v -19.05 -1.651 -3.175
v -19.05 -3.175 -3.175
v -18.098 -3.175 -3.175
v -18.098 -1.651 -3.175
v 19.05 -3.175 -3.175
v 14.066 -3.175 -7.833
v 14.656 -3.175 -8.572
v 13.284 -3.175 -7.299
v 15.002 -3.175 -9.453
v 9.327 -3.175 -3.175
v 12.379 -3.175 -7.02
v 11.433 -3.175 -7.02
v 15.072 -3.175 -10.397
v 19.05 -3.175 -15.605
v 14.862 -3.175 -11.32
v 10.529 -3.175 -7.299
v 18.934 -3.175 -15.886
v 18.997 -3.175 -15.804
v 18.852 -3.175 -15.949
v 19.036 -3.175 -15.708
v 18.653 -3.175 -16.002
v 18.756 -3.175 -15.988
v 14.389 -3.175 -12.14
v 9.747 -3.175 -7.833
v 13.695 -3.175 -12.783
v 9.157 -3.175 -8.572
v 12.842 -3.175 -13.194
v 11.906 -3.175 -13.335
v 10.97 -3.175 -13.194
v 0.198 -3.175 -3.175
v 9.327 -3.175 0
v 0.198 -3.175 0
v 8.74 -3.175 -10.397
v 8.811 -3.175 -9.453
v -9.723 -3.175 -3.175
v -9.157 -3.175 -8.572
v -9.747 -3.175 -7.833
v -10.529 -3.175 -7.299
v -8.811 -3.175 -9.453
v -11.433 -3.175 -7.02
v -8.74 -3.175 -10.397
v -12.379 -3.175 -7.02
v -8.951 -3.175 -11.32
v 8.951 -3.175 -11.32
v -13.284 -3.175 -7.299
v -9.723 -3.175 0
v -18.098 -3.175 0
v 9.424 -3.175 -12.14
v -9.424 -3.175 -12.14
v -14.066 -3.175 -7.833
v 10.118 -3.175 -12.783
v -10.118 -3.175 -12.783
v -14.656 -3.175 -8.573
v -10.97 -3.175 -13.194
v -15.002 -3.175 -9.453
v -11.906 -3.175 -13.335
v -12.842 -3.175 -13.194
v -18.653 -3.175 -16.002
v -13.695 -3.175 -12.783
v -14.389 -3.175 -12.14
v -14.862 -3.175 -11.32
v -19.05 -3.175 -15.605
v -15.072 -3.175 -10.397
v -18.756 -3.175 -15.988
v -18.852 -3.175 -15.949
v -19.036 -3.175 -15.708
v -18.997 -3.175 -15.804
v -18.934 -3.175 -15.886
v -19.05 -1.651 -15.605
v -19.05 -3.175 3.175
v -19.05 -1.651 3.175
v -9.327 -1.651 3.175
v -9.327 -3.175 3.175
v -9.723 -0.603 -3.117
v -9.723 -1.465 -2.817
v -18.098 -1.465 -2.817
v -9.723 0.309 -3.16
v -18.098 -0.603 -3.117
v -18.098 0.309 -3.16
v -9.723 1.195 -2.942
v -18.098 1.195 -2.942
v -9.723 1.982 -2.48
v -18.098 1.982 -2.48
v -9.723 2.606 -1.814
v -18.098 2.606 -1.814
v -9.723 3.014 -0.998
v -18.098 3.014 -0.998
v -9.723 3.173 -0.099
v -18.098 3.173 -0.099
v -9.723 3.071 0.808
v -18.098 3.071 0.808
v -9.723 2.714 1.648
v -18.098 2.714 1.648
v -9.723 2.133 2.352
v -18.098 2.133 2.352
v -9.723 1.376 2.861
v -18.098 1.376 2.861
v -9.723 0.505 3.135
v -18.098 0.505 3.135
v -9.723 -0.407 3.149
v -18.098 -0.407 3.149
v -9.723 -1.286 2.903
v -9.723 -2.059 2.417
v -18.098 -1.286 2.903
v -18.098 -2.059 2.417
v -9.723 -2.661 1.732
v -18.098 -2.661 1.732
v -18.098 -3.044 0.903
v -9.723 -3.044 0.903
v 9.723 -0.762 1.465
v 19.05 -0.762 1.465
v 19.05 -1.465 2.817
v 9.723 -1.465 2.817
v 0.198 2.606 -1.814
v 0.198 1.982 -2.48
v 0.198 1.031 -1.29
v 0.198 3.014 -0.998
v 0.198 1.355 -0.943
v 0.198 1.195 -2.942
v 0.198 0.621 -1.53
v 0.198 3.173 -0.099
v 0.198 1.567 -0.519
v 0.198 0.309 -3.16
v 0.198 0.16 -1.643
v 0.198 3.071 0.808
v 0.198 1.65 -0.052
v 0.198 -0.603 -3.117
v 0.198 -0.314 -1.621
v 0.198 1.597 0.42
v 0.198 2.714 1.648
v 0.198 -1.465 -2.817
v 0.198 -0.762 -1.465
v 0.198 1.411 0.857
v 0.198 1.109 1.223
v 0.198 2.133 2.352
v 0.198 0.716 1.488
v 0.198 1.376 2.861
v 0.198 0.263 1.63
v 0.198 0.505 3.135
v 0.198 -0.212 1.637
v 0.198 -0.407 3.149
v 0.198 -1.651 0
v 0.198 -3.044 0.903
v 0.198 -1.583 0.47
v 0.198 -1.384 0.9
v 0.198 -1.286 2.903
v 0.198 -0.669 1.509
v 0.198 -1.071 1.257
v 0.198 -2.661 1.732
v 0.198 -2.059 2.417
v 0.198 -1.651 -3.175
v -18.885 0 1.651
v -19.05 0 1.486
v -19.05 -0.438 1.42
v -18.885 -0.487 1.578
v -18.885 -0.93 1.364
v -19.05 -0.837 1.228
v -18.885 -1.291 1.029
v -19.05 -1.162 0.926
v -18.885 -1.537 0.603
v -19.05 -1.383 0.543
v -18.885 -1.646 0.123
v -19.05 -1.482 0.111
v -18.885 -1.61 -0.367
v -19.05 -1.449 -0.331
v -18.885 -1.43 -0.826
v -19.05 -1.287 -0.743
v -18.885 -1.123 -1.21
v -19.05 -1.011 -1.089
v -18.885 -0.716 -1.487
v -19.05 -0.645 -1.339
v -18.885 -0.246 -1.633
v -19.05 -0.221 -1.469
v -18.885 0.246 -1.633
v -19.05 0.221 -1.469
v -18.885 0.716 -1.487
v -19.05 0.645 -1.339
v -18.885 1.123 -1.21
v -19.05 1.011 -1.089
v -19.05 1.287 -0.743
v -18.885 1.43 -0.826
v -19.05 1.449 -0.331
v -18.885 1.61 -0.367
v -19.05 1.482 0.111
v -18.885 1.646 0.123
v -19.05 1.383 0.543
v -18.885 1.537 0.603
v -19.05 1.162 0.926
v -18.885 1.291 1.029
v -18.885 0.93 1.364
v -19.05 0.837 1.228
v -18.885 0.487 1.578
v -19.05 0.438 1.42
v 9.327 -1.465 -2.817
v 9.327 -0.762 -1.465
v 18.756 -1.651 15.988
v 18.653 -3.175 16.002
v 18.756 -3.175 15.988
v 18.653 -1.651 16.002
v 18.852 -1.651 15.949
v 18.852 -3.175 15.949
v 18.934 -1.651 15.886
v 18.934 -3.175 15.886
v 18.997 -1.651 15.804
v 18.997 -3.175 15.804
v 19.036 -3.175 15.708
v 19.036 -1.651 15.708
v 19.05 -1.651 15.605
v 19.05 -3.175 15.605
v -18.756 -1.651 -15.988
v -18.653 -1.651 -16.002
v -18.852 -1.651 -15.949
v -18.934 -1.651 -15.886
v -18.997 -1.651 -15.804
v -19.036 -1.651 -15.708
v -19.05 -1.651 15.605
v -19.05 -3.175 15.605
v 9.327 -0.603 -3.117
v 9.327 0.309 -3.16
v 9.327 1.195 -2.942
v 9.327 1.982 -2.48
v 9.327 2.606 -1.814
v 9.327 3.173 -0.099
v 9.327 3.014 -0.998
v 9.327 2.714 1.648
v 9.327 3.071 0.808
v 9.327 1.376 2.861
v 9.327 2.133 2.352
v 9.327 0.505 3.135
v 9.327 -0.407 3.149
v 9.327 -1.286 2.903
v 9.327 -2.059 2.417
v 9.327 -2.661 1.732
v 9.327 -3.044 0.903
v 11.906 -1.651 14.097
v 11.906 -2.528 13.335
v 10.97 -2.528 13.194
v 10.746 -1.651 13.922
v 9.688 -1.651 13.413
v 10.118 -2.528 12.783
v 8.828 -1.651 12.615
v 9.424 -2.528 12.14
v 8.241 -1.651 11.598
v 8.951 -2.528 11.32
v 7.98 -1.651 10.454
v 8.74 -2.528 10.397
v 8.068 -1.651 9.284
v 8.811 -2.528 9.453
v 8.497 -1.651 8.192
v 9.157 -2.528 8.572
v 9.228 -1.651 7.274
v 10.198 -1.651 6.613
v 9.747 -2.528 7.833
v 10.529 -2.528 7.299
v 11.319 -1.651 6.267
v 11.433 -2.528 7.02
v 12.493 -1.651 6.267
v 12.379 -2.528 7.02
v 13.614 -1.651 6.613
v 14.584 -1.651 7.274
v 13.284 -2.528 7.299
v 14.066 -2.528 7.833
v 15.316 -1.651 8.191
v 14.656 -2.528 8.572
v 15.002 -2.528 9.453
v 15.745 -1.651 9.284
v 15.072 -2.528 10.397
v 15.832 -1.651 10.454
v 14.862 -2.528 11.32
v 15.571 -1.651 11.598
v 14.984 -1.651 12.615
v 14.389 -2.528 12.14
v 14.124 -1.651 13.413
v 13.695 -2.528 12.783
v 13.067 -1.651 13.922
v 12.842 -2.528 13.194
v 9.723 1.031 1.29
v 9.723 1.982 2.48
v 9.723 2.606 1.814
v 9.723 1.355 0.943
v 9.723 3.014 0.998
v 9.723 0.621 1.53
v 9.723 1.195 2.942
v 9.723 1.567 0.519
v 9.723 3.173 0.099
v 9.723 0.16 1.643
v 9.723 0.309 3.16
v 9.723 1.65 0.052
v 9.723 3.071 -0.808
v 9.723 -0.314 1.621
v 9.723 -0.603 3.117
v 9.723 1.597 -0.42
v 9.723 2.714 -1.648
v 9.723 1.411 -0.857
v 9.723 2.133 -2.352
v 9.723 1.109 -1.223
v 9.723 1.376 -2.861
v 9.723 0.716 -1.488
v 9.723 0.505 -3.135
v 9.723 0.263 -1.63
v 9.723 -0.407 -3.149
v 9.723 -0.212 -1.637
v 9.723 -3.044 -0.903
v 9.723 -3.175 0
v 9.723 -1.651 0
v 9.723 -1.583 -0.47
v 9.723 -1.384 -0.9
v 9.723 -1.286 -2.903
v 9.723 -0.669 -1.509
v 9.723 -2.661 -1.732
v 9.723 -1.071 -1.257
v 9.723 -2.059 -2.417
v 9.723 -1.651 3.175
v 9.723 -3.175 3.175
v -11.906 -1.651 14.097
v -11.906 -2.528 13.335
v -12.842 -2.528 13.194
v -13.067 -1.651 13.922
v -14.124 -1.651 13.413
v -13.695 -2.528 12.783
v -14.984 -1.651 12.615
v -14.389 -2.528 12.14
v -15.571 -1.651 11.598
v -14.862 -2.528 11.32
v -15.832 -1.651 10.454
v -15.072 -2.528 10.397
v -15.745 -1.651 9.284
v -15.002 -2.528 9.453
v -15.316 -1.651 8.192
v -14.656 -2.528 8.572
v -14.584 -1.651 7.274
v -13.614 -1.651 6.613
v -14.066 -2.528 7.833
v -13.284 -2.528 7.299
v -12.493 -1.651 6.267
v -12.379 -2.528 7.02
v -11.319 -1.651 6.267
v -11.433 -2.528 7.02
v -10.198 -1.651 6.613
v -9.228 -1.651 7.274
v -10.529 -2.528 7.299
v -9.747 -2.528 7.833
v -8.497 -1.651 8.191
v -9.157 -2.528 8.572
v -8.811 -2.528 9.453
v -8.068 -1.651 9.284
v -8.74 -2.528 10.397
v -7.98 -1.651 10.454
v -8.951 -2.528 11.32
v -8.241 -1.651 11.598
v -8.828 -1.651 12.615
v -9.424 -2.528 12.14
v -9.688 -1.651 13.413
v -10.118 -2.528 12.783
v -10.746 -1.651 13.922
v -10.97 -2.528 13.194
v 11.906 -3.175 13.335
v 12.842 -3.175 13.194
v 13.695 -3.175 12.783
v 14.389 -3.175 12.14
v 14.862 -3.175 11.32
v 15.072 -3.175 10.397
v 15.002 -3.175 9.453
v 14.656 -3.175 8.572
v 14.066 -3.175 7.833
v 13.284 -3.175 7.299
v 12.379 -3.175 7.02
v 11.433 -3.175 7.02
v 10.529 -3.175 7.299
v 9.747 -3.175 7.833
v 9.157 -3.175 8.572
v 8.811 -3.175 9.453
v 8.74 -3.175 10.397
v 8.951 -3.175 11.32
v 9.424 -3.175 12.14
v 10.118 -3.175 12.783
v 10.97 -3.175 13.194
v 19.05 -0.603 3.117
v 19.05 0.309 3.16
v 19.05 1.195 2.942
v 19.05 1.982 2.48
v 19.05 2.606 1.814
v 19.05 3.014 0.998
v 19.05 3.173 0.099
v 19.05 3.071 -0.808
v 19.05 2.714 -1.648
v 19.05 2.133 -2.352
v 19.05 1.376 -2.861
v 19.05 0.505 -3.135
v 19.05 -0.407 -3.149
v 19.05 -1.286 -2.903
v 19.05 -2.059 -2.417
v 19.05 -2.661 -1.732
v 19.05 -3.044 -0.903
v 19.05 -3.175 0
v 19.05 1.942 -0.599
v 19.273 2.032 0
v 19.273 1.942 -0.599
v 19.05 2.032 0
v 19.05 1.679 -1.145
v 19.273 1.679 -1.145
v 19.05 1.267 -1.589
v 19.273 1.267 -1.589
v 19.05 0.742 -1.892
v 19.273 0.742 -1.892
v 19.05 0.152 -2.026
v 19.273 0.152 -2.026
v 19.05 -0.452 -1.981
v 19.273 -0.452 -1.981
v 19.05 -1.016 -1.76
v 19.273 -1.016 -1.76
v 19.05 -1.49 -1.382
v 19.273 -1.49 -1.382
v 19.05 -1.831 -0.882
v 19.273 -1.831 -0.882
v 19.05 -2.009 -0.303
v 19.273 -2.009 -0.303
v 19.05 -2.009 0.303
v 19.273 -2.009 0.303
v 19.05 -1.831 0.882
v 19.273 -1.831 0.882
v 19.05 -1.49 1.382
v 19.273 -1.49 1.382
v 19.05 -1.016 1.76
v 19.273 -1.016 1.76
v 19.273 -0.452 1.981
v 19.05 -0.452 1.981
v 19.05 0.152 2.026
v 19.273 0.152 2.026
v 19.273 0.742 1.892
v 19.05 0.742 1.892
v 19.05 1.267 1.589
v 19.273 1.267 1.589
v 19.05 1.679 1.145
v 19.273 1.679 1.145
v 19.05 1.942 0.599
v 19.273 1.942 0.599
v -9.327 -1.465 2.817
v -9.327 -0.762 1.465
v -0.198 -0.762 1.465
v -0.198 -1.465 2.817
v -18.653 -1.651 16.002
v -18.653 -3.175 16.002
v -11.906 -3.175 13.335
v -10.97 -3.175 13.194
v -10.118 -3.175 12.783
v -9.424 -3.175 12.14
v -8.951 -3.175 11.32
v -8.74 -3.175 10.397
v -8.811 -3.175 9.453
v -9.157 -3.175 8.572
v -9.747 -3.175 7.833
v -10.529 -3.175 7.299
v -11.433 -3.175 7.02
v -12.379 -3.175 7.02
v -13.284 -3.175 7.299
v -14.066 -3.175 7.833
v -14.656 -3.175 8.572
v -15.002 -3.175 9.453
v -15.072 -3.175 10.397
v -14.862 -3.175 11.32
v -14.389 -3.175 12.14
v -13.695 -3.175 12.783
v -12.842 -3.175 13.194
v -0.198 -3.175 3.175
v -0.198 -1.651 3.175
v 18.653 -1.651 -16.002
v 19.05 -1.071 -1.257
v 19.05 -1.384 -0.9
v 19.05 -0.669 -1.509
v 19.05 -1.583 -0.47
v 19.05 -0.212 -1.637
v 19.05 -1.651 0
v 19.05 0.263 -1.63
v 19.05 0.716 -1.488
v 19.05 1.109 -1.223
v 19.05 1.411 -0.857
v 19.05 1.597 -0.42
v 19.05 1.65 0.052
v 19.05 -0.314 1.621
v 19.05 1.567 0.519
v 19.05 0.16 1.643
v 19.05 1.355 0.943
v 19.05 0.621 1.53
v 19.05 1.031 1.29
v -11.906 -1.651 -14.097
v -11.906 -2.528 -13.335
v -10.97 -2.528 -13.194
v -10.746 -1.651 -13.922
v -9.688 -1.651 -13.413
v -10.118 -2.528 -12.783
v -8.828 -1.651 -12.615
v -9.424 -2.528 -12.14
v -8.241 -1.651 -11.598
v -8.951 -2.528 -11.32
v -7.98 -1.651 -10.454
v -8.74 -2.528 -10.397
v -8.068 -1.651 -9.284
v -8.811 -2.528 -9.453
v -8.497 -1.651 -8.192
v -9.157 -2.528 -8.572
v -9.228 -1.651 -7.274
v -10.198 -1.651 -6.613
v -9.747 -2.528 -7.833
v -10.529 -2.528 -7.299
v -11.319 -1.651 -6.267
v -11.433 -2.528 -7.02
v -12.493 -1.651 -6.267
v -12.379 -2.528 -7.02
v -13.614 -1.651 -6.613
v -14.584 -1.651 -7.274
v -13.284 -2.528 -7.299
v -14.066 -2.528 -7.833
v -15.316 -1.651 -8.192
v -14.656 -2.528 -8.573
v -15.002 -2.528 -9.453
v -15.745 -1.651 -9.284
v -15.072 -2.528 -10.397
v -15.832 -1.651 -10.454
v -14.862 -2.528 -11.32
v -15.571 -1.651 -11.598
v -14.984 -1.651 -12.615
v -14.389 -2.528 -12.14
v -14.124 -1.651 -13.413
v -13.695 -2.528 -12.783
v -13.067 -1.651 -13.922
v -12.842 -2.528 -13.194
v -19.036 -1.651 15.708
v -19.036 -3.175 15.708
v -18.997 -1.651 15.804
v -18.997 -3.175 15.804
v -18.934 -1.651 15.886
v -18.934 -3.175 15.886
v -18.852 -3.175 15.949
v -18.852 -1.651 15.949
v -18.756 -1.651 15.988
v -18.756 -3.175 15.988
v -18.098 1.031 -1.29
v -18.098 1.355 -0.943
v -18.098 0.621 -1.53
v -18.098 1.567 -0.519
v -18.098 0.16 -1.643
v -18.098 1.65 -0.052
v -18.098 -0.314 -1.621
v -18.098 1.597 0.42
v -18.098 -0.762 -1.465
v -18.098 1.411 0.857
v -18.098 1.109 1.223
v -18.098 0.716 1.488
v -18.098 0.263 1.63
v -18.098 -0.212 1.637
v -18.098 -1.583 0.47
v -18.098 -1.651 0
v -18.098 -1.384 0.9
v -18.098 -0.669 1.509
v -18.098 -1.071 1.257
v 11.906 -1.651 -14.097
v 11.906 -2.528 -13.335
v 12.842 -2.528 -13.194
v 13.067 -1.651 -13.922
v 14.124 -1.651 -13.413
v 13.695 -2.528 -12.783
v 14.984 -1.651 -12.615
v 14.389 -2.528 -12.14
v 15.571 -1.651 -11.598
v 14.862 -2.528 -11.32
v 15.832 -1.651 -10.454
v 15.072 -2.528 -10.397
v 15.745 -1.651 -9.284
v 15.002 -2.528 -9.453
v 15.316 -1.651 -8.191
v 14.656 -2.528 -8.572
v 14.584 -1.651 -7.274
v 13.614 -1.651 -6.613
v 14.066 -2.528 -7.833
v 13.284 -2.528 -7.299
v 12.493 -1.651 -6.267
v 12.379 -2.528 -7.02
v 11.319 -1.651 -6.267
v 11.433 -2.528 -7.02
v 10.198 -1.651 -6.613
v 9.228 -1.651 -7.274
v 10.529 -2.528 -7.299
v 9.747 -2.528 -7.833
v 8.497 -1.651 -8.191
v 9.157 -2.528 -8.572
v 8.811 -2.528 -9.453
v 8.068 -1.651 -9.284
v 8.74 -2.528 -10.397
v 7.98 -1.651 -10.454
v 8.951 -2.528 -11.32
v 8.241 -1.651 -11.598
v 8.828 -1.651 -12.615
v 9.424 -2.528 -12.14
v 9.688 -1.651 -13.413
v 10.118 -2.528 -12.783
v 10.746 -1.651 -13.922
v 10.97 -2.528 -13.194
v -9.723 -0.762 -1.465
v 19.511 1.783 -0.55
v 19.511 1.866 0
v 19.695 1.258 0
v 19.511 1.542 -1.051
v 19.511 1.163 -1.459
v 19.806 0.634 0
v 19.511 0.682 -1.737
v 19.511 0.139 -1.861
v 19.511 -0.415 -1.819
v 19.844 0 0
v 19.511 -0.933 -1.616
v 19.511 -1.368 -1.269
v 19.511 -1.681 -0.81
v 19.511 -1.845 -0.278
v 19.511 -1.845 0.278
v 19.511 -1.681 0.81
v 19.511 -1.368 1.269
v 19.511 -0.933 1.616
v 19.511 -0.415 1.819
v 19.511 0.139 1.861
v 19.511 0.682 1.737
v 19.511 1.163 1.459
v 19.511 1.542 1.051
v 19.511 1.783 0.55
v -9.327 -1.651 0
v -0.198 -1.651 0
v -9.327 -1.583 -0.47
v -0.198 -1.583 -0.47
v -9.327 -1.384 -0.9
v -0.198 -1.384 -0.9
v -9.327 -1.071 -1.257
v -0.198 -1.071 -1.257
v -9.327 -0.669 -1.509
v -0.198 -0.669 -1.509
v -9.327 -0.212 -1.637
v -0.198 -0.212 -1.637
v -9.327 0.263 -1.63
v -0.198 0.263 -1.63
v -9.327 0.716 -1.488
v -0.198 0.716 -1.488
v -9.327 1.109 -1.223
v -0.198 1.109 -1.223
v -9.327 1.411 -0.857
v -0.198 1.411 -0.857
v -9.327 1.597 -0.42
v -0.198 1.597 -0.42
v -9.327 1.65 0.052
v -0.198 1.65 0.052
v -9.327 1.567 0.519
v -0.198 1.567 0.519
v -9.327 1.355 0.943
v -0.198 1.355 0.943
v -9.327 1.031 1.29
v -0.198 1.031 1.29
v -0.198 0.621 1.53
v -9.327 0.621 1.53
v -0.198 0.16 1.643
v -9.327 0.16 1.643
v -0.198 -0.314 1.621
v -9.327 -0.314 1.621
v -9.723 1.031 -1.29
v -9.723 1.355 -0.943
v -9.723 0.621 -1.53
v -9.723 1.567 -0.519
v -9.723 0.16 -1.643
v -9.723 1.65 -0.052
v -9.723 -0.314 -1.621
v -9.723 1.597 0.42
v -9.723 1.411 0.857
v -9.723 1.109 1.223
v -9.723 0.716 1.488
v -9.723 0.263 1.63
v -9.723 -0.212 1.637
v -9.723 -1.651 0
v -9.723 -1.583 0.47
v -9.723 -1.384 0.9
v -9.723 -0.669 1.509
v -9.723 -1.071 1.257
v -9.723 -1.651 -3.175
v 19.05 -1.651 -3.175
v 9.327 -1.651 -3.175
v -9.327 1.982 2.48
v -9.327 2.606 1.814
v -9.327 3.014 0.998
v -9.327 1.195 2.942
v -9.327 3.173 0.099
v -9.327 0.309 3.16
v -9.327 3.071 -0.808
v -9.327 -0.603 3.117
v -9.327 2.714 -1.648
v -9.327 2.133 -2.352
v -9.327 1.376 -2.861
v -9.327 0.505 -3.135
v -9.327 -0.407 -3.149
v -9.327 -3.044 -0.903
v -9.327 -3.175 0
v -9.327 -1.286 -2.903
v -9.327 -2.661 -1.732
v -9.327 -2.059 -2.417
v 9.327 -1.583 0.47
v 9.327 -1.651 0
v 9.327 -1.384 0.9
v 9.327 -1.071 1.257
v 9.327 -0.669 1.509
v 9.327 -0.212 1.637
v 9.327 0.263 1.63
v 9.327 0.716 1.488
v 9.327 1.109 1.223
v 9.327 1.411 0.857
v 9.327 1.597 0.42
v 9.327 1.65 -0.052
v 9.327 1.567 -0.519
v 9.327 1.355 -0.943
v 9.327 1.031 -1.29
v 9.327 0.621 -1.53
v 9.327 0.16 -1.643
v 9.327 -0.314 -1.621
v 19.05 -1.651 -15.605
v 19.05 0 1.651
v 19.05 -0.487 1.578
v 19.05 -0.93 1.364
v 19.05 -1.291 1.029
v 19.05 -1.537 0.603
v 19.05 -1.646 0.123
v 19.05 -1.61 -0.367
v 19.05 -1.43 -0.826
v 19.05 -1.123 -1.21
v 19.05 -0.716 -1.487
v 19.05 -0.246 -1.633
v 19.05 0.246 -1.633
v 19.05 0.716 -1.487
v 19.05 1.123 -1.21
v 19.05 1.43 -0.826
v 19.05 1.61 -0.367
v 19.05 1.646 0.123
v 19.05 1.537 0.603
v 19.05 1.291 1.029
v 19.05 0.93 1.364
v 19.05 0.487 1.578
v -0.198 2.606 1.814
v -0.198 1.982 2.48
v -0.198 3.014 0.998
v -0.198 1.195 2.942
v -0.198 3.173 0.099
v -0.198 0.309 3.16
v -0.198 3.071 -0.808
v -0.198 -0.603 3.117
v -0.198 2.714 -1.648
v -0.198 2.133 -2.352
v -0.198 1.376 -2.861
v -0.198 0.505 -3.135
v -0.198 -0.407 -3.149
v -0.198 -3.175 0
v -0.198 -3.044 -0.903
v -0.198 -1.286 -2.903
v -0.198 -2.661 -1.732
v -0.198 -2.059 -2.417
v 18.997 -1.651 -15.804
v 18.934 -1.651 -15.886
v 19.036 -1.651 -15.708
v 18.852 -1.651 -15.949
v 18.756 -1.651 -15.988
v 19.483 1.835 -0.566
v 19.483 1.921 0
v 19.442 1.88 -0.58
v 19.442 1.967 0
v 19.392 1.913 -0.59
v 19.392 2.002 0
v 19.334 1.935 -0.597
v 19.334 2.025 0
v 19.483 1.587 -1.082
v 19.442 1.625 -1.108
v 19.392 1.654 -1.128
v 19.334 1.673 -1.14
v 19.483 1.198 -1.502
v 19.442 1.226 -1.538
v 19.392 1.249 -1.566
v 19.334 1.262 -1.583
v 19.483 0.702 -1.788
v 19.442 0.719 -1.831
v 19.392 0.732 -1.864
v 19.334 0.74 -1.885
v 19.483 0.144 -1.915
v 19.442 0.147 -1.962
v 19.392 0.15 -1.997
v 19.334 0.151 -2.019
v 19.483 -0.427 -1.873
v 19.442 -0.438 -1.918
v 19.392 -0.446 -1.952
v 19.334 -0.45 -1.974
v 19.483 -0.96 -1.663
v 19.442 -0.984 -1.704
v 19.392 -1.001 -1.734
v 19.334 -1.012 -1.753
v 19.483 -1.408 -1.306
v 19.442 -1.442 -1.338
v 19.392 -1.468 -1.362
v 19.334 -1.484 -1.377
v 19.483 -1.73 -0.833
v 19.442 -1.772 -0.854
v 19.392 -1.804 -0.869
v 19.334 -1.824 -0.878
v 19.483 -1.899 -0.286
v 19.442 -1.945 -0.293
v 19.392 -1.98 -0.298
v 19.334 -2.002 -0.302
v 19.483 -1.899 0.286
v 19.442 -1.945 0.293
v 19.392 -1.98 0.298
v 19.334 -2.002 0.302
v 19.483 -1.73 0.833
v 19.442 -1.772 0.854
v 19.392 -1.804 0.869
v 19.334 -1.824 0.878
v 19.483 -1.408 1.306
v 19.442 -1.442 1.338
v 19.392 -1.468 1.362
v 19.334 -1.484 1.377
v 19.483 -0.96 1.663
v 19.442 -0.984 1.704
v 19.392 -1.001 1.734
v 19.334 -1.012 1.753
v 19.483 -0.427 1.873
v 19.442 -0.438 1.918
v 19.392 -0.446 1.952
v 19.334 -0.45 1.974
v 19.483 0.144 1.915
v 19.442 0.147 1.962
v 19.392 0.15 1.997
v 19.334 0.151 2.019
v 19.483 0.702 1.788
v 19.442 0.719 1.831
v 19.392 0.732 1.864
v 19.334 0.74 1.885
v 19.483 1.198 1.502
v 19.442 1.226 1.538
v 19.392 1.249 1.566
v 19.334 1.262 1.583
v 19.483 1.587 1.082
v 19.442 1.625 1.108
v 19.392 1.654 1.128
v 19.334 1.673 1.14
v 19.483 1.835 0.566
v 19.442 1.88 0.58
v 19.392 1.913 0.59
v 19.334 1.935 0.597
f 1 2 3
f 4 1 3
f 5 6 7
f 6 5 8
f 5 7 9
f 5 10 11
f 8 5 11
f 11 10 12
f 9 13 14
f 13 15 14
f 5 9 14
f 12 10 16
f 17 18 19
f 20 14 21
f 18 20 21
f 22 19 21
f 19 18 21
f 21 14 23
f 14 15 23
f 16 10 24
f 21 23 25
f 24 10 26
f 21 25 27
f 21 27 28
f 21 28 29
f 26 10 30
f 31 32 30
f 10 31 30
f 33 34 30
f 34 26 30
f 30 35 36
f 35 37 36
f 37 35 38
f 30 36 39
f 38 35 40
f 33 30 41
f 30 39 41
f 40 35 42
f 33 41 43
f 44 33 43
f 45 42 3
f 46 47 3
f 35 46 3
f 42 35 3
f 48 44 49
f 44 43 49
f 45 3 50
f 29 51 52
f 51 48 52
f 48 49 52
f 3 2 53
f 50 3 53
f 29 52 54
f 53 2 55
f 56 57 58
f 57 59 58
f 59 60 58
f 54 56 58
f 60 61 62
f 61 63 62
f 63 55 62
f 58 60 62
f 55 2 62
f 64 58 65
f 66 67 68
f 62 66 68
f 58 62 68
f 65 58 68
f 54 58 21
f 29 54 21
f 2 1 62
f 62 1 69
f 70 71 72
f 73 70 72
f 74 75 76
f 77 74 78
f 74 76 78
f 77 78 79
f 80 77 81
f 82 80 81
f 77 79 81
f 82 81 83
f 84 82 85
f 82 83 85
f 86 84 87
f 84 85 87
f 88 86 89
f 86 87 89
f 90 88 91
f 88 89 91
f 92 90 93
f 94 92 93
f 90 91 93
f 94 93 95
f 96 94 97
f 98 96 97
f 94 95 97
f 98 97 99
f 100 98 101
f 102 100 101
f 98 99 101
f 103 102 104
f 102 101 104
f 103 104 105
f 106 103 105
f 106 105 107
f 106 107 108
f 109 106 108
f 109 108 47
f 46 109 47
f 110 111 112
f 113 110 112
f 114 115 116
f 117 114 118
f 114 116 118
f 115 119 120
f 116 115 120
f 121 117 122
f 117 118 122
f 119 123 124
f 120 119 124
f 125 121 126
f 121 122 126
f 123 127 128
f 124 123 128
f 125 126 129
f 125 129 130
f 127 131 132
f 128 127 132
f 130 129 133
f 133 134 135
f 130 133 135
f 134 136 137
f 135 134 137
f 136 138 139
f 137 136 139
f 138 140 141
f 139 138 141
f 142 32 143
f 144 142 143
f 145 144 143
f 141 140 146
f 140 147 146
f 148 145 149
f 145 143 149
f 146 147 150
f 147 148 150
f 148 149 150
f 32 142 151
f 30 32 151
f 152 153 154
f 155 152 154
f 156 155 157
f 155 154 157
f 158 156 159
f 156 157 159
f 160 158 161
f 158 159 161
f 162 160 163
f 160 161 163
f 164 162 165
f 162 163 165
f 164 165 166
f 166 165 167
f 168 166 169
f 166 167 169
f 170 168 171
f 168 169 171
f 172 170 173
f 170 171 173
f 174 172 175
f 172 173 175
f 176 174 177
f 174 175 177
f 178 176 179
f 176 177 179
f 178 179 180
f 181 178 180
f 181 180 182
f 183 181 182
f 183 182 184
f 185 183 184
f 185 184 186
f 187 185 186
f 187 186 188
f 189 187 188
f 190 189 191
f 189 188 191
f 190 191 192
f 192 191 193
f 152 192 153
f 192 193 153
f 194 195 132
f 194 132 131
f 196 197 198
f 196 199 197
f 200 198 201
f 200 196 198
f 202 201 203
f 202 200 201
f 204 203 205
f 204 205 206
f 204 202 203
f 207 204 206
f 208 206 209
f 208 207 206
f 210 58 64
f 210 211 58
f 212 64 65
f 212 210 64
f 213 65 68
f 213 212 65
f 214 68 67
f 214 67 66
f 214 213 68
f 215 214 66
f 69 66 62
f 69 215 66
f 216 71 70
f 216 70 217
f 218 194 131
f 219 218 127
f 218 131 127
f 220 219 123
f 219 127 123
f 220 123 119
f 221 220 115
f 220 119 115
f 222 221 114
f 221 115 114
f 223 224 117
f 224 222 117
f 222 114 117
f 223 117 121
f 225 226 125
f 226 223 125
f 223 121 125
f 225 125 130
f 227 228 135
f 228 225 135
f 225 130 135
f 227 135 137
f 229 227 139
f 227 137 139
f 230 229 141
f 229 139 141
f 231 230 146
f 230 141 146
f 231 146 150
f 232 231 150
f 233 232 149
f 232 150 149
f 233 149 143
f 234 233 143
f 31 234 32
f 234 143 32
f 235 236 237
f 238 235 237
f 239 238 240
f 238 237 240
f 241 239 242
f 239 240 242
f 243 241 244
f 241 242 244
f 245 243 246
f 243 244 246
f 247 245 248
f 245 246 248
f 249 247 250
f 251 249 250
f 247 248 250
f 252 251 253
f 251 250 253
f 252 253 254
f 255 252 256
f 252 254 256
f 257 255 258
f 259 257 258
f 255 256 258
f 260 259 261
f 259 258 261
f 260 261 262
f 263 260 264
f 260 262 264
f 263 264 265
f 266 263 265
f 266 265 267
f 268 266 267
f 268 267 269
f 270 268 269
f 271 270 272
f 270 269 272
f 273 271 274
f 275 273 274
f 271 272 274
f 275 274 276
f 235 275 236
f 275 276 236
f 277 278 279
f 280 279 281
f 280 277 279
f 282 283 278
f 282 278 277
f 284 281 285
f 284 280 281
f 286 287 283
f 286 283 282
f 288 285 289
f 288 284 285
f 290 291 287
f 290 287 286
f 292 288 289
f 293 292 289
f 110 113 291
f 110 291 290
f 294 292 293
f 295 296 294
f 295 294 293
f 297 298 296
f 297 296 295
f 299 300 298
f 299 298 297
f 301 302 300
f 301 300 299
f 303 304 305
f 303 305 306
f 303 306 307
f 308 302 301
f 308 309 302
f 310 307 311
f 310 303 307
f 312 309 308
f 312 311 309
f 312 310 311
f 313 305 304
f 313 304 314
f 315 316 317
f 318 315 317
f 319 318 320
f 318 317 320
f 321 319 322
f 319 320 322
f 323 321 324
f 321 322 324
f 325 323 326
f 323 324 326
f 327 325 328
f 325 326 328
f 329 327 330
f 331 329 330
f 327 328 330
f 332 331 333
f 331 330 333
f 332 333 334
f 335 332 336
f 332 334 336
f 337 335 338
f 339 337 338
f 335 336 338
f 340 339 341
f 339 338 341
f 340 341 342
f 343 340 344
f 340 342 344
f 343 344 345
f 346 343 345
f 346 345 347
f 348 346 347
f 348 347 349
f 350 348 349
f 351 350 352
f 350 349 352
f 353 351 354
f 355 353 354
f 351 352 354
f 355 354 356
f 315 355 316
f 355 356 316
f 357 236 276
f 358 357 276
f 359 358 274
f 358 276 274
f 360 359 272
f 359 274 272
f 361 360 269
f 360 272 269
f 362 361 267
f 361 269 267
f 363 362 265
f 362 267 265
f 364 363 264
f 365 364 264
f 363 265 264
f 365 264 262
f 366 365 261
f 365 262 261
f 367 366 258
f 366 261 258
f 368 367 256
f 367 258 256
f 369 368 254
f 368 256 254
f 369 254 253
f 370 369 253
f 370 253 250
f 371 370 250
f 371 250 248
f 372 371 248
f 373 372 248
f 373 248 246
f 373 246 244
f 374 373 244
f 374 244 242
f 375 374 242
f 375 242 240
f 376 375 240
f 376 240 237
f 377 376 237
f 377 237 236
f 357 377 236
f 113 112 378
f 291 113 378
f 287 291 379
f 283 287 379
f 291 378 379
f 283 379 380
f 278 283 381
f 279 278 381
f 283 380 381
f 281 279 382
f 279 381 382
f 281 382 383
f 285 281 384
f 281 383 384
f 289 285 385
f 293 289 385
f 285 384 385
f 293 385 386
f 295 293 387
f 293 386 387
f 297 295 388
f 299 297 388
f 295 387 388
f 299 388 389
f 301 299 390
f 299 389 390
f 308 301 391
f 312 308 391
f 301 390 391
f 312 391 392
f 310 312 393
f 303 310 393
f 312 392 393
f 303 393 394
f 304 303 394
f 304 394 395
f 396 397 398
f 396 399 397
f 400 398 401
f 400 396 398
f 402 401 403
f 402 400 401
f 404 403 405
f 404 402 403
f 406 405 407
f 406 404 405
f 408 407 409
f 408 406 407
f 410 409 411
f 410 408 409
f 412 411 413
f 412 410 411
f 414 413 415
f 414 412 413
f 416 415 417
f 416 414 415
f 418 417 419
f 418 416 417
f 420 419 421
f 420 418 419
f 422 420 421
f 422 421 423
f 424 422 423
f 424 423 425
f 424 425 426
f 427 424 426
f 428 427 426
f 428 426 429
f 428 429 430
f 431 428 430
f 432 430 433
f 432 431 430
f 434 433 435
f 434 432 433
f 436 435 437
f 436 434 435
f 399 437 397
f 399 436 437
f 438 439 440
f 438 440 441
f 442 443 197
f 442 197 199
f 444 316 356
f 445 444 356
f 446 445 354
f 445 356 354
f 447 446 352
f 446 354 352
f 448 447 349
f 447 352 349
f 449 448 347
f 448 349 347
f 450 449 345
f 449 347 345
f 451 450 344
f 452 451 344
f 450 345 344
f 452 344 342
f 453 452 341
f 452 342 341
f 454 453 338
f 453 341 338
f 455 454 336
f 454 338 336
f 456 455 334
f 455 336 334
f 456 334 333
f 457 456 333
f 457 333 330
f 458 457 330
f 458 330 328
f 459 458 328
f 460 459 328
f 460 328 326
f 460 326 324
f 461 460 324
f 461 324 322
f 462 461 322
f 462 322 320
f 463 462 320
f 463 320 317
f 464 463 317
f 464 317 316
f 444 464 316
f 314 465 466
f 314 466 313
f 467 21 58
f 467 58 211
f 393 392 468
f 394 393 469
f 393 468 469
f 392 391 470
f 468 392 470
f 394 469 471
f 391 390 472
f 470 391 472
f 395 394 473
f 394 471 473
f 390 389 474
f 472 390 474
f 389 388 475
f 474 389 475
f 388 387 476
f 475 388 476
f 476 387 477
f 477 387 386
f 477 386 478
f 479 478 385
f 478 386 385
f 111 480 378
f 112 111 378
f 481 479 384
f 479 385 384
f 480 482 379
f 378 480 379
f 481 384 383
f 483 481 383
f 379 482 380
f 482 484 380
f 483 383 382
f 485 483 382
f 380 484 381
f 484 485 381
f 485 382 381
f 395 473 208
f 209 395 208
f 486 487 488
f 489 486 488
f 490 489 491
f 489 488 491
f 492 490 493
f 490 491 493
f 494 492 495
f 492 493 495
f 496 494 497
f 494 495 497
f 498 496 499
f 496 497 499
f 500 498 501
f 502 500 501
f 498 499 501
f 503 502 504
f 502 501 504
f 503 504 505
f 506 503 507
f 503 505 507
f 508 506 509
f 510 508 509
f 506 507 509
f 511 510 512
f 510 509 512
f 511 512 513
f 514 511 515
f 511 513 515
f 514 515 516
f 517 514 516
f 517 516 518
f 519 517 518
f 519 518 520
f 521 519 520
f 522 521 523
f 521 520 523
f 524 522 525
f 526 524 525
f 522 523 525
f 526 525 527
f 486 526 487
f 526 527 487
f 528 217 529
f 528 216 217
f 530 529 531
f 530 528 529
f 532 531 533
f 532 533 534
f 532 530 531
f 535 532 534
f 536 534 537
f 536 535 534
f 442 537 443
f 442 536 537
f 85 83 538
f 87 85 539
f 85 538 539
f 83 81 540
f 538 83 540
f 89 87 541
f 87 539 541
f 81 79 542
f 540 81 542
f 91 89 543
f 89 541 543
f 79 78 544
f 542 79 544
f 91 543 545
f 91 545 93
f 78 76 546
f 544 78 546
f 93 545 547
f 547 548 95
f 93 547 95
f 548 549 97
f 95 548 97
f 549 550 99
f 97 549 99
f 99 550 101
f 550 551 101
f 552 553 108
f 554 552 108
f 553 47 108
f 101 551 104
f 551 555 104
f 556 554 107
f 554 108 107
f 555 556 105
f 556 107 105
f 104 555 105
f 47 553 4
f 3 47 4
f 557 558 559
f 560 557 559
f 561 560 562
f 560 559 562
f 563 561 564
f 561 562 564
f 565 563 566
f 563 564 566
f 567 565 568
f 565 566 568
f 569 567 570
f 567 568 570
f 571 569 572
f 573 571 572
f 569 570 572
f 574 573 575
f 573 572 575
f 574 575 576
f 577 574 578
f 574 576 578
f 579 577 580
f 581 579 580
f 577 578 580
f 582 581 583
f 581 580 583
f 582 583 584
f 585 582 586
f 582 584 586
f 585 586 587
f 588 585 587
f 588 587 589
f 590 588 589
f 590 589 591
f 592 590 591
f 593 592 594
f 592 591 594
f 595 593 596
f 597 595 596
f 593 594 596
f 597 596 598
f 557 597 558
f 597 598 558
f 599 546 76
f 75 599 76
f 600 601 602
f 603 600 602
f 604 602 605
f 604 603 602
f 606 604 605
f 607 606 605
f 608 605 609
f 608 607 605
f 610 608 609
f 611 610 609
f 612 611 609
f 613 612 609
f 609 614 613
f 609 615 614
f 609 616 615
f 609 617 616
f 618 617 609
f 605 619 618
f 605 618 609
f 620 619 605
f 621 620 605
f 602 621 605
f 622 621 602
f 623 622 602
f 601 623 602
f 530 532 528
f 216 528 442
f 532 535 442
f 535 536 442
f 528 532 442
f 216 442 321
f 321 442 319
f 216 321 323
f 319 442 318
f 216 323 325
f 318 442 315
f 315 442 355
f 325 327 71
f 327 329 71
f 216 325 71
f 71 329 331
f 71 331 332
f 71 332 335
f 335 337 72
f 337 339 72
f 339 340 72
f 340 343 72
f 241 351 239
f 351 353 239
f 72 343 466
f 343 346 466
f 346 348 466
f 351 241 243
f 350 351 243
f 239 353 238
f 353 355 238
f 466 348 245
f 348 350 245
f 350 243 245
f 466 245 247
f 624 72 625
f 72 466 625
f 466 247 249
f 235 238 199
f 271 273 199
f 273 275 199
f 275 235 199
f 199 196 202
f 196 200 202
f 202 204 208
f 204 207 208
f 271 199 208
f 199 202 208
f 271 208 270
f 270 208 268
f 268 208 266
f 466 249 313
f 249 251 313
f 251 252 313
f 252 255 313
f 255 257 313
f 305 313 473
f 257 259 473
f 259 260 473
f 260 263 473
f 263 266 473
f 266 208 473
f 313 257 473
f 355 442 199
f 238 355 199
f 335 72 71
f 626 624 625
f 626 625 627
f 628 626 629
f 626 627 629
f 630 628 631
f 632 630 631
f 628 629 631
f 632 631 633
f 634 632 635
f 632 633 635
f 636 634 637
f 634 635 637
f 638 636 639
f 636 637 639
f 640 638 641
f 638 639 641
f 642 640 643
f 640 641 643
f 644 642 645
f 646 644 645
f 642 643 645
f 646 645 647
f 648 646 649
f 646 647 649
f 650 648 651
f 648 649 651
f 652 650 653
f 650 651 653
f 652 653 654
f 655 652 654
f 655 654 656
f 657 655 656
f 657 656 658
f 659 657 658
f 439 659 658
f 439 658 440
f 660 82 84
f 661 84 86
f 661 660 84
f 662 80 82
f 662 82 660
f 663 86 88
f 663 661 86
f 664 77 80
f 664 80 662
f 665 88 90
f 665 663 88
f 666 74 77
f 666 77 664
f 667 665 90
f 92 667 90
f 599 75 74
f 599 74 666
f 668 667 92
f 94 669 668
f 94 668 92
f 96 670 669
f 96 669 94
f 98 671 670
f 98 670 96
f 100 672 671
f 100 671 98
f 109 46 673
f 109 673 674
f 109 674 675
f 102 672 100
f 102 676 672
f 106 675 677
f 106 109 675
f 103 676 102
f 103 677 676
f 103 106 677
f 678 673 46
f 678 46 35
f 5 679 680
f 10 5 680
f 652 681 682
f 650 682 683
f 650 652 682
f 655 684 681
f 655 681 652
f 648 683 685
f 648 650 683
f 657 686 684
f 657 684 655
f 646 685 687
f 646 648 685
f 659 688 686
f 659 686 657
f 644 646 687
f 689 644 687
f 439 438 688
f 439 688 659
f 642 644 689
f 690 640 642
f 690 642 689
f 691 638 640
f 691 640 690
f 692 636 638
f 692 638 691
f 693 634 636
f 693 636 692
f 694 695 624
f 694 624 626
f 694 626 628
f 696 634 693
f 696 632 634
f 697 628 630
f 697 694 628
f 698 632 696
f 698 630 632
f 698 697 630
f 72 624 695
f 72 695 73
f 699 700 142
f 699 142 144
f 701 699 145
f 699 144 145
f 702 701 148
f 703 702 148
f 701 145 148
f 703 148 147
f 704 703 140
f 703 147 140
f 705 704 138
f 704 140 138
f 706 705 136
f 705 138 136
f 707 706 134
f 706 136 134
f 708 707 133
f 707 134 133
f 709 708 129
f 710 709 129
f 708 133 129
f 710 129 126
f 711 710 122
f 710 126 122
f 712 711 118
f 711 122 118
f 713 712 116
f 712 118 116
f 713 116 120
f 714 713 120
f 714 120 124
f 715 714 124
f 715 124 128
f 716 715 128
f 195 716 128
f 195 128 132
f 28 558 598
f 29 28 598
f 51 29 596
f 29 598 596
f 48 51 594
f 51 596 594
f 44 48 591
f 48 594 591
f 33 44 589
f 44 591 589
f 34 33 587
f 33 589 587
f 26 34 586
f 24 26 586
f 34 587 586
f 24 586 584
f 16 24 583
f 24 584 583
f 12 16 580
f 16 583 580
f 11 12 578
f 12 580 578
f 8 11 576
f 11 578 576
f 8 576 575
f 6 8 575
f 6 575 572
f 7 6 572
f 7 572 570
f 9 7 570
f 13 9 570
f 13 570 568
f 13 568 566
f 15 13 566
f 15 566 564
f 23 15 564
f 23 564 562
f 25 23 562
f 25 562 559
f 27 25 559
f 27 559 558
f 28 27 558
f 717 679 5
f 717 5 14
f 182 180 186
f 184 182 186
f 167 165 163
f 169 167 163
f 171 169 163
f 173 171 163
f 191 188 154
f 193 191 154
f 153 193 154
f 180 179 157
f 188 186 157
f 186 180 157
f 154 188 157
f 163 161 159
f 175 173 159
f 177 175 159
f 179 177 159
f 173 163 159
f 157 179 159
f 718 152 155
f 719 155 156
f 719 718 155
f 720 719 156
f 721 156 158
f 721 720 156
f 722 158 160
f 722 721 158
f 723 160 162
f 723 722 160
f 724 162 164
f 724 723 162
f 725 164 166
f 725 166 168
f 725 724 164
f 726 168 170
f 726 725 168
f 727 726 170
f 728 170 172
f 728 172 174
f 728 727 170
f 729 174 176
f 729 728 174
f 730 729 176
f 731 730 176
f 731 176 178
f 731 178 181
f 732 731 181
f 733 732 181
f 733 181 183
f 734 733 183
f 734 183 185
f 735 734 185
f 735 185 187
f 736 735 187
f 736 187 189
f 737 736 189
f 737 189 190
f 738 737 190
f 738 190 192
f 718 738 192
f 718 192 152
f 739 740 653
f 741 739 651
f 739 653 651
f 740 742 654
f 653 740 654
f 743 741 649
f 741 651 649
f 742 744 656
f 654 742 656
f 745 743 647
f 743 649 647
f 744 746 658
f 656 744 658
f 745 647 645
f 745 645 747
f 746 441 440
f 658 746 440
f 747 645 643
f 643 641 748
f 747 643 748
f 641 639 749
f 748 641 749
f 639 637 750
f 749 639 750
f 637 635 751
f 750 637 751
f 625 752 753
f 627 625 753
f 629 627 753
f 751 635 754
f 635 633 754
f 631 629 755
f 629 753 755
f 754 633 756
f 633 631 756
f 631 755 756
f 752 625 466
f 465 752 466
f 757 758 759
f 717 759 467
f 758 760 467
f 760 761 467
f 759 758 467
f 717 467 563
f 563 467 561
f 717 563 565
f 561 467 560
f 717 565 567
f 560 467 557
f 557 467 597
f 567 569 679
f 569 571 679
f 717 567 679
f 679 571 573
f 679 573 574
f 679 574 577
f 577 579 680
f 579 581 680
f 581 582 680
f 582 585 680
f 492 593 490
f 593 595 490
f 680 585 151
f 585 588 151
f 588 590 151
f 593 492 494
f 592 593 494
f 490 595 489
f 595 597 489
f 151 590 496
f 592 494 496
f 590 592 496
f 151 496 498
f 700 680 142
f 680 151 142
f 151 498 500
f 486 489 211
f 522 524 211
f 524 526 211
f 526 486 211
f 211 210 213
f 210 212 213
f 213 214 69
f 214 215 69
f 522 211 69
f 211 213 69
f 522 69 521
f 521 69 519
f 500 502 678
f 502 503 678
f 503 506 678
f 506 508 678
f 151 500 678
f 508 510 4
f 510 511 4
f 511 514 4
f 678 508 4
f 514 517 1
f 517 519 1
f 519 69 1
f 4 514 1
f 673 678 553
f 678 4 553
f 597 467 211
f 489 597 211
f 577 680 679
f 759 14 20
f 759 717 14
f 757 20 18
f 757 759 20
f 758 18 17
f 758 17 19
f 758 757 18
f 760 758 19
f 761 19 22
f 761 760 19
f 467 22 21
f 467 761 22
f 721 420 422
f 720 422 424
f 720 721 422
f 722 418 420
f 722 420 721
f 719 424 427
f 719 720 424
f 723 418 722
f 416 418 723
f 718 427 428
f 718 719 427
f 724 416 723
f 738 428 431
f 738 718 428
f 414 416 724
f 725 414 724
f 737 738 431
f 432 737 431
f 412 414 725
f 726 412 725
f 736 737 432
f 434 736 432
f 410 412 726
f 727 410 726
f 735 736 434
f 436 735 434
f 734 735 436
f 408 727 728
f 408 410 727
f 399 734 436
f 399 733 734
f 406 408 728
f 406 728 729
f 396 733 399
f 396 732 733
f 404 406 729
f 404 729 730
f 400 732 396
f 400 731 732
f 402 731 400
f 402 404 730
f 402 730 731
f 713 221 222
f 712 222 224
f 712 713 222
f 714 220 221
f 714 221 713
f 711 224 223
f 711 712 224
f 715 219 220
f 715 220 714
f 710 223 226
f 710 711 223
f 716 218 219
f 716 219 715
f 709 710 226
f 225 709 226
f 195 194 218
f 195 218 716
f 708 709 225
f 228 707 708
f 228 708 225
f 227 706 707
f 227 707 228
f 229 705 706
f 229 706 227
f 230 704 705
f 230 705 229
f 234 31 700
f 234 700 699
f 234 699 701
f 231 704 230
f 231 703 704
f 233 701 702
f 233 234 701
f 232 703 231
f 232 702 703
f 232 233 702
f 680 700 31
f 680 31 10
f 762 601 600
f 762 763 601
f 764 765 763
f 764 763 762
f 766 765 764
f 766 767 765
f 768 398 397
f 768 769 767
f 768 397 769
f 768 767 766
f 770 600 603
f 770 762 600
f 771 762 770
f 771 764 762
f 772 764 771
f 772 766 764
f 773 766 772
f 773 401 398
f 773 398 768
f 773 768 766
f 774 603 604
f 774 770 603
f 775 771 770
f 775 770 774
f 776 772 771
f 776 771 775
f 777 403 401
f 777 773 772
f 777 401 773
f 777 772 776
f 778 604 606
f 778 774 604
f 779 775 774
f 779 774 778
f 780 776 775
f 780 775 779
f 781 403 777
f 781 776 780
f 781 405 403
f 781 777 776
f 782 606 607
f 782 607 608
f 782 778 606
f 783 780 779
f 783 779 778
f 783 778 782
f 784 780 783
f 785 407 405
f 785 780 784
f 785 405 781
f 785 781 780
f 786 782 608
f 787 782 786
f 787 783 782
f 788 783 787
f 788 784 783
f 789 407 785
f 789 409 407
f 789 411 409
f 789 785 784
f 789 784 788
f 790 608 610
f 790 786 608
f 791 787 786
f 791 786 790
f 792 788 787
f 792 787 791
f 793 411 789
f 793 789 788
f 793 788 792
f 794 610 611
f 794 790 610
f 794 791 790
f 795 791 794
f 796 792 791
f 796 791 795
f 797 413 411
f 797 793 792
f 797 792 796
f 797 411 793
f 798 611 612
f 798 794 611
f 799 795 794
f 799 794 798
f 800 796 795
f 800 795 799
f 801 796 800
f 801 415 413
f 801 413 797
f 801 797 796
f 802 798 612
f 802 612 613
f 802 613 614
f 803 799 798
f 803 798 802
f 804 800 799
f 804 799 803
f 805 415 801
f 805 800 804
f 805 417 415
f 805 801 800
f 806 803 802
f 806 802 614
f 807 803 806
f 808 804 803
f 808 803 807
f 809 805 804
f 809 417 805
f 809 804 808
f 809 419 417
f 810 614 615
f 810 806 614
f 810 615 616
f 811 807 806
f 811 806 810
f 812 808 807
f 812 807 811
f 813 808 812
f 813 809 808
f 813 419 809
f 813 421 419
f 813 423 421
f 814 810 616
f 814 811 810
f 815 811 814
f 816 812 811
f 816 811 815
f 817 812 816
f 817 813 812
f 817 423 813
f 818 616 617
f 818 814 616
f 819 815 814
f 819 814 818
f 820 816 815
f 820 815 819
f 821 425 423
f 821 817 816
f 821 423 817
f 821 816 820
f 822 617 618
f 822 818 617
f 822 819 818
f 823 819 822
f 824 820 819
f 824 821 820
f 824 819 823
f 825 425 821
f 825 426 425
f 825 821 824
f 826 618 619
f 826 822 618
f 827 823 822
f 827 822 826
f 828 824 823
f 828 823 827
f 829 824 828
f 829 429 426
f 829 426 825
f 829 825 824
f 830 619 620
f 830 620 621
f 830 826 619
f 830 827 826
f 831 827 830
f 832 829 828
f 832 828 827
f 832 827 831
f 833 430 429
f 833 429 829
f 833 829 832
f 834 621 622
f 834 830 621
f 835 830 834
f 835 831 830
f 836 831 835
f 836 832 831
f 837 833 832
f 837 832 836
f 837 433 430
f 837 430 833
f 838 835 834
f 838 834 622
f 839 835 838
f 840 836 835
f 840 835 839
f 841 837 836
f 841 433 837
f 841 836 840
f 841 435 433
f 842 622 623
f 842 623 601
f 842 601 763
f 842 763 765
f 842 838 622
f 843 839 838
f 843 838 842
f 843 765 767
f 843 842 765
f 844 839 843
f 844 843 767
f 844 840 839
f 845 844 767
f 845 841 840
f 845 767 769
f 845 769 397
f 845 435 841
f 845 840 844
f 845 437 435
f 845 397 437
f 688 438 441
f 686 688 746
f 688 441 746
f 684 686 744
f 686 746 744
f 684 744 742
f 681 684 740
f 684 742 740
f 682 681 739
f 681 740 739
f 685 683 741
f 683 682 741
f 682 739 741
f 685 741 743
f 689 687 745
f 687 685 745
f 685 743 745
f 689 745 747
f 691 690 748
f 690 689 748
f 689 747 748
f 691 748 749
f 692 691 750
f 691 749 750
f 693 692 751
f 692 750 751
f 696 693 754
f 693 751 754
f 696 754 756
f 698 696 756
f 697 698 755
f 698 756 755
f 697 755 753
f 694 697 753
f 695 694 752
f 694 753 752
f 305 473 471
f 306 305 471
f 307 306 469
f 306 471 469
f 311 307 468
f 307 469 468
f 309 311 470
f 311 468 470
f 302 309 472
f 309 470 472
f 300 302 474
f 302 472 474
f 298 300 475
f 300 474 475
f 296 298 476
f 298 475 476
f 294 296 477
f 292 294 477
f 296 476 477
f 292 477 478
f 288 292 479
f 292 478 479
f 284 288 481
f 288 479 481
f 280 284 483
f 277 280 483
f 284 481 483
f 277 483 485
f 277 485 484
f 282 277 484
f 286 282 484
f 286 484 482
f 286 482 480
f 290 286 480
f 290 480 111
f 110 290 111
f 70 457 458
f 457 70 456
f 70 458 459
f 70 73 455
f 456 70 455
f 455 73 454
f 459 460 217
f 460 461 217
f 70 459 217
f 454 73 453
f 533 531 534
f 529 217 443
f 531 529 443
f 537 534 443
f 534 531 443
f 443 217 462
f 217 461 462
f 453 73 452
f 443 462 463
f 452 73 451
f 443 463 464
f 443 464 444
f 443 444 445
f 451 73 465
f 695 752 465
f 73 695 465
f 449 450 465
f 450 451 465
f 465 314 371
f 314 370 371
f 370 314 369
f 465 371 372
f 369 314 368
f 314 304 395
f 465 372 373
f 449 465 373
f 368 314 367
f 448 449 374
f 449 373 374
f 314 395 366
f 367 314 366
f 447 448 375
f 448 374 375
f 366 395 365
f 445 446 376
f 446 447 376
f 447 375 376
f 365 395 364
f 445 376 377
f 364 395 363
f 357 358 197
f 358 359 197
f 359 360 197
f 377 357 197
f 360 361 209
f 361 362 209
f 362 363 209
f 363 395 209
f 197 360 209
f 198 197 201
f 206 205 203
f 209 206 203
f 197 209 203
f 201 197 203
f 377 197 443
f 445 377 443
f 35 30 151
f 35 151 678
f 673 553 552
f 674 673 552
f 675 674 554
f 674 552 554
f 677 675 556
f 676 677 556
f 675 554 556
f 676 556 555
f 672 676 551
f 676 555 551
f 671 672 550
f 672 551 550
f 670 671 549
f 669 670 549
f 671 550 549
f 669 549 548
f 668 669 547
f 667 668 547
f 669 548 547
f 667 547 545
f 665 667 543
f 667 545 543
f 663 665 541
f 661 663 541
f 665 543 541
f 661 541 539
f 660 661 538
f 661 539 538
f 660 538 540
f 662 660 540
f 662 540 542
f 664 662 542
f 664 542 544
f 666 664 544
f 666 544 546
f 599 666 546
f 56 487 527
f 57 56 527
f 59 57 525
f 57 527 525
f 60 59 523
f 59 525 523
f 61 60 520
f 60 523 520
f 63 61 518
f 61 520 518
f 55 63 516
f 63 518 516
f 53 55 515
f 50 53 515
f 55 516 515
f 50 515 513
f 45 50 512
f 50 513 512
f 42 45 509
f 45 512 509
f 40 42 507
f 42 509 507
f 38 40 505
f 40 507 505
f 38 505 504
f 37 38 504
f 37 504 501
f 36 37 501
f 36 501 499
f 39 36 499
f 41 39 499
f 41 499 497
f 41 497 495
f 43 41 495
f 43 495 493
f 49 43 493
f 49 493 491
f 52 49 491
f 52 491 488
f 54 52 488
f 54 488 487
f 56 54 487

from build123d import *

# Parameters (mm, degrees)
BOSS_EXTRUDE1_DEPTH     = 19.05
SKETCH4_W               = 9.525
SKETCH4_H               = 6.35
CUT_EXTRUDE1_DEPTH      = 26.080811969
LPATTERN1_COUNT         = 2
LPATTERN1_PITCH         = 19.05
CUT_EXTRUDE2_DEPTH      = 26.342785561
CUT_EXTRUDE2_DEPTH_BACK = 26.342785561
SKETCH5_W               = 0.1984375
SKETCH5_H               = 6.35
SKETCH6_R               = 3.175
CUT_EXTRUDE3_DEPTH      = 26.342785561
FILLET1_R               = 0.396875
CIRPATTERN1_COUNT       = 2
SKETCH8_R               = 1.651
BOSS_EXTRUDE2_DEPTH     = 19.05
SKETCH10_W              = 0.9525
SKETCH10_H              = 6.35
CUT_EXTRUDE5_DEPTH      = 27.270913918
CHAMFER1_SIZE           = 0.1651


with BuildPart() as part:
    # Sketch3 → Boss-Extrude1 (new, symmetric)
    with BuildSketch(Plane(origin=(0, 0, 0), x_dir=(0, 0, -1), z_dir=(1, 0, 0))):
        with BuildLine():
            Line((0, -3.175), (-16.002, -3.175))
            Line((-16.002, -3.175), (-16.002, -1.651))
            Line((-16.002, -1.651), (0, -1.651))
            ThreePointArc((0, -1.651), (0.856809561, 1.411268357), (-1.464794939, -0.761693368))
            Line((-1.464794939, -0.761693368), (-2.816913344, -1.464794939))
            ThreePointArc((-2.816913344, -1.464794939), (1.647710695, 2.71397761), (0, -3.175))
        make_face()
    extrude(amount=BOSS_EXTRUDE1_DEPTH, both=True)

    # Sketch4 → Cut-Extrude1 (cut, symmetric)
    with BuildSketch(Plane(origin=(0, 0, 0), x_dir=(1, 0, 0), z_dir=(0, 1, 0))):
        with Locations((4.7625, 0)):
            Rectangle(SKETCH4_W, SKETCH4_H)
    cut_extrude1 = extrude(amount=CUT_EXTRUDE1_DEPTH, both=True, mode=Mode.SUBTRACT)

    # LPattern1: Cut-Extrude1 ×2
    with Locations(*[(-i * LPATTERN1_PITCH, 0, 0) for i in range(1, LPATTERN1_COUNT)]):
        add(cut_extrude1, mode=Mode.SUBTRACT)

    # Sketch5 → Cut-Extrude2 (cut, two sides: drawn at the far end of the back side and taken through both)
    with BuildSketch(Plane(origin=(0, -1.651, 0), x_dir=(1, 0, 0), z_dir=(0, 1, 0)).offset(-CUT_EXTRUDE2_DEPTH_BACK)):
        with Locations((-9.42578125, 0)):
            Rectangle(SKETCH5_W, SKETCH5_H)
        with Locations((-0.09921875, 0)):
            Rectangle(SKETCH5_W, SKETCH5_H)
        with Locations((9.62421875, 0)):
            Rectangle(SKETCH5_W, SKETCH5_H)
    extrude(amount=CUT_EXTRUDE2_DEPTH + CUT_EXTRUDE2_DEPTH_BACK, mode=Mode.SUBTRACT)

    # Sketch6 → Cut-Extrude3 (cut, through all)
    with BuildSketch(Plane(origin=(0, -1.651, 0), x_dir=(1, 0, 0), z_dir=(0, 1, 0))):
        with Locations(Location((11.90625, -10.16, 0), (0, 0, 270))):
            Circle(SKETCH6_R)
        with Locations(Location((-11.90625, -10.16, 0), (0, 0, 270))):
            Circle(SKETCH6_R)
    extrude(amount=-CUT_EXTRUDE3_DEPTH, mode=Mode.SUBTRACT)

    # Cut-Extrude4 cone 1 section (through the dimple's axis) → Cut-Extrude4 (revolve, cut)
    with BuildSketch(Plane(origin=(-11.90625, -1.651, 10.16), x_dir=(0, 0, 1), z_dir=(1, 0, 0))):
        Polygon((0, 0), (3.937, 0), (0, 4.529000419), align=None)
    revolve(axis=Axis((-11.90625, -1.651, 10.16), (0, -1, 0)), mode=Mode.SUBTRACT)

    # Cut-Extrude4 cone 2 section (through the dimple's axis) → Cut-Extrude4 cone 2 (revolve, cut)
    with BuildSketch(Plane(origin=(11.90625, -1.651, 10.16), x_dir=(0, 0, 1), z_dir=(1, 0, 0))):
        Polygon((0, 0), (3.937, 0), (0, 4.529000419), align=None)
    revolve(axis=Axis((11.90625, -1.651, 10.16), (0, -1, 0)), mode=Mode.SUBTRACT)

    # Fillet1
    fillet1_edges = [part.edges().sort_by_distance(p)[0] for p in [
        (19.05, -2.413, 16.002),
        (-19.05, -2.413, 16.002),
    ]]
    fillet(fillet1_edges, radius=FILLET1_R)


with BuildPart() as cirpattern1_1:
    # CirPattern1: pattern copy
    add(part.part.rotate(Axis((0, 0, 0), (0, 1, 0)), 1 * 360 / CIRPATTERN1_COUNT))

    # Sketch10 → Cut-Extrude5 (cut, through all)
    with BuildSketch(Plane.XZ.offset(3.175)):
        with Locations((-18.57375, 0)):
            Rectangle(SKETCH10_W, SKETCH10_H)
    extrude(amount=-CUT_EXTRUDE5_DEPTH, mode=Mode.SUBTRACT)


with BuildPart() as body_3:
    # Sketch8 → Boss-Extrude2 (new, symmetric)
    with BuildSketch(Plane(origin=(0, 0, 0), x_dir=(0, 0, -1), z_dir=(1, 0, 0))):
        with Locations(Location((0, 0, 0), (0, 0, 180))):
            Circle(SKETCH8_R)
    extrude(amount=BOSS_EXTRUDE2_DEPTH, both=True)

    # Sketch9 → Revolve1 (revolve)
    with BuildSketch(Plane.XY):
        with BuildLine():
            Line((19.05, 2.032), (19.05, 0))
            Line((19.05, 0), (19.84375, 0))
            ThreePointArc((19.84375, 0), (19.759966303, 0.947578032), (19.511214931, 1.865753717))
            ThreePointArc((19.511214931, 1.865753717), (19.418159448, 1.9863332), (19.27285536, 2.032))
            Line((19.27285536, 2.032), (19.05, 2.032))
        make_face()
    revolve(axis=Axis((19.05, 0, 0), (-1, 0, 0)))

    # Chamfer1
    chamfer1_edges = [body_3.edges().sort_by_distance(p)[0] for p in [
        (-19.05, 0, -1.651),
    ]]
    chamfer(chamfer1_edges, length=CHAMFER1_SIZE)


solid = Compound([part.part, cirpattern1_1.part, body_3.part])
